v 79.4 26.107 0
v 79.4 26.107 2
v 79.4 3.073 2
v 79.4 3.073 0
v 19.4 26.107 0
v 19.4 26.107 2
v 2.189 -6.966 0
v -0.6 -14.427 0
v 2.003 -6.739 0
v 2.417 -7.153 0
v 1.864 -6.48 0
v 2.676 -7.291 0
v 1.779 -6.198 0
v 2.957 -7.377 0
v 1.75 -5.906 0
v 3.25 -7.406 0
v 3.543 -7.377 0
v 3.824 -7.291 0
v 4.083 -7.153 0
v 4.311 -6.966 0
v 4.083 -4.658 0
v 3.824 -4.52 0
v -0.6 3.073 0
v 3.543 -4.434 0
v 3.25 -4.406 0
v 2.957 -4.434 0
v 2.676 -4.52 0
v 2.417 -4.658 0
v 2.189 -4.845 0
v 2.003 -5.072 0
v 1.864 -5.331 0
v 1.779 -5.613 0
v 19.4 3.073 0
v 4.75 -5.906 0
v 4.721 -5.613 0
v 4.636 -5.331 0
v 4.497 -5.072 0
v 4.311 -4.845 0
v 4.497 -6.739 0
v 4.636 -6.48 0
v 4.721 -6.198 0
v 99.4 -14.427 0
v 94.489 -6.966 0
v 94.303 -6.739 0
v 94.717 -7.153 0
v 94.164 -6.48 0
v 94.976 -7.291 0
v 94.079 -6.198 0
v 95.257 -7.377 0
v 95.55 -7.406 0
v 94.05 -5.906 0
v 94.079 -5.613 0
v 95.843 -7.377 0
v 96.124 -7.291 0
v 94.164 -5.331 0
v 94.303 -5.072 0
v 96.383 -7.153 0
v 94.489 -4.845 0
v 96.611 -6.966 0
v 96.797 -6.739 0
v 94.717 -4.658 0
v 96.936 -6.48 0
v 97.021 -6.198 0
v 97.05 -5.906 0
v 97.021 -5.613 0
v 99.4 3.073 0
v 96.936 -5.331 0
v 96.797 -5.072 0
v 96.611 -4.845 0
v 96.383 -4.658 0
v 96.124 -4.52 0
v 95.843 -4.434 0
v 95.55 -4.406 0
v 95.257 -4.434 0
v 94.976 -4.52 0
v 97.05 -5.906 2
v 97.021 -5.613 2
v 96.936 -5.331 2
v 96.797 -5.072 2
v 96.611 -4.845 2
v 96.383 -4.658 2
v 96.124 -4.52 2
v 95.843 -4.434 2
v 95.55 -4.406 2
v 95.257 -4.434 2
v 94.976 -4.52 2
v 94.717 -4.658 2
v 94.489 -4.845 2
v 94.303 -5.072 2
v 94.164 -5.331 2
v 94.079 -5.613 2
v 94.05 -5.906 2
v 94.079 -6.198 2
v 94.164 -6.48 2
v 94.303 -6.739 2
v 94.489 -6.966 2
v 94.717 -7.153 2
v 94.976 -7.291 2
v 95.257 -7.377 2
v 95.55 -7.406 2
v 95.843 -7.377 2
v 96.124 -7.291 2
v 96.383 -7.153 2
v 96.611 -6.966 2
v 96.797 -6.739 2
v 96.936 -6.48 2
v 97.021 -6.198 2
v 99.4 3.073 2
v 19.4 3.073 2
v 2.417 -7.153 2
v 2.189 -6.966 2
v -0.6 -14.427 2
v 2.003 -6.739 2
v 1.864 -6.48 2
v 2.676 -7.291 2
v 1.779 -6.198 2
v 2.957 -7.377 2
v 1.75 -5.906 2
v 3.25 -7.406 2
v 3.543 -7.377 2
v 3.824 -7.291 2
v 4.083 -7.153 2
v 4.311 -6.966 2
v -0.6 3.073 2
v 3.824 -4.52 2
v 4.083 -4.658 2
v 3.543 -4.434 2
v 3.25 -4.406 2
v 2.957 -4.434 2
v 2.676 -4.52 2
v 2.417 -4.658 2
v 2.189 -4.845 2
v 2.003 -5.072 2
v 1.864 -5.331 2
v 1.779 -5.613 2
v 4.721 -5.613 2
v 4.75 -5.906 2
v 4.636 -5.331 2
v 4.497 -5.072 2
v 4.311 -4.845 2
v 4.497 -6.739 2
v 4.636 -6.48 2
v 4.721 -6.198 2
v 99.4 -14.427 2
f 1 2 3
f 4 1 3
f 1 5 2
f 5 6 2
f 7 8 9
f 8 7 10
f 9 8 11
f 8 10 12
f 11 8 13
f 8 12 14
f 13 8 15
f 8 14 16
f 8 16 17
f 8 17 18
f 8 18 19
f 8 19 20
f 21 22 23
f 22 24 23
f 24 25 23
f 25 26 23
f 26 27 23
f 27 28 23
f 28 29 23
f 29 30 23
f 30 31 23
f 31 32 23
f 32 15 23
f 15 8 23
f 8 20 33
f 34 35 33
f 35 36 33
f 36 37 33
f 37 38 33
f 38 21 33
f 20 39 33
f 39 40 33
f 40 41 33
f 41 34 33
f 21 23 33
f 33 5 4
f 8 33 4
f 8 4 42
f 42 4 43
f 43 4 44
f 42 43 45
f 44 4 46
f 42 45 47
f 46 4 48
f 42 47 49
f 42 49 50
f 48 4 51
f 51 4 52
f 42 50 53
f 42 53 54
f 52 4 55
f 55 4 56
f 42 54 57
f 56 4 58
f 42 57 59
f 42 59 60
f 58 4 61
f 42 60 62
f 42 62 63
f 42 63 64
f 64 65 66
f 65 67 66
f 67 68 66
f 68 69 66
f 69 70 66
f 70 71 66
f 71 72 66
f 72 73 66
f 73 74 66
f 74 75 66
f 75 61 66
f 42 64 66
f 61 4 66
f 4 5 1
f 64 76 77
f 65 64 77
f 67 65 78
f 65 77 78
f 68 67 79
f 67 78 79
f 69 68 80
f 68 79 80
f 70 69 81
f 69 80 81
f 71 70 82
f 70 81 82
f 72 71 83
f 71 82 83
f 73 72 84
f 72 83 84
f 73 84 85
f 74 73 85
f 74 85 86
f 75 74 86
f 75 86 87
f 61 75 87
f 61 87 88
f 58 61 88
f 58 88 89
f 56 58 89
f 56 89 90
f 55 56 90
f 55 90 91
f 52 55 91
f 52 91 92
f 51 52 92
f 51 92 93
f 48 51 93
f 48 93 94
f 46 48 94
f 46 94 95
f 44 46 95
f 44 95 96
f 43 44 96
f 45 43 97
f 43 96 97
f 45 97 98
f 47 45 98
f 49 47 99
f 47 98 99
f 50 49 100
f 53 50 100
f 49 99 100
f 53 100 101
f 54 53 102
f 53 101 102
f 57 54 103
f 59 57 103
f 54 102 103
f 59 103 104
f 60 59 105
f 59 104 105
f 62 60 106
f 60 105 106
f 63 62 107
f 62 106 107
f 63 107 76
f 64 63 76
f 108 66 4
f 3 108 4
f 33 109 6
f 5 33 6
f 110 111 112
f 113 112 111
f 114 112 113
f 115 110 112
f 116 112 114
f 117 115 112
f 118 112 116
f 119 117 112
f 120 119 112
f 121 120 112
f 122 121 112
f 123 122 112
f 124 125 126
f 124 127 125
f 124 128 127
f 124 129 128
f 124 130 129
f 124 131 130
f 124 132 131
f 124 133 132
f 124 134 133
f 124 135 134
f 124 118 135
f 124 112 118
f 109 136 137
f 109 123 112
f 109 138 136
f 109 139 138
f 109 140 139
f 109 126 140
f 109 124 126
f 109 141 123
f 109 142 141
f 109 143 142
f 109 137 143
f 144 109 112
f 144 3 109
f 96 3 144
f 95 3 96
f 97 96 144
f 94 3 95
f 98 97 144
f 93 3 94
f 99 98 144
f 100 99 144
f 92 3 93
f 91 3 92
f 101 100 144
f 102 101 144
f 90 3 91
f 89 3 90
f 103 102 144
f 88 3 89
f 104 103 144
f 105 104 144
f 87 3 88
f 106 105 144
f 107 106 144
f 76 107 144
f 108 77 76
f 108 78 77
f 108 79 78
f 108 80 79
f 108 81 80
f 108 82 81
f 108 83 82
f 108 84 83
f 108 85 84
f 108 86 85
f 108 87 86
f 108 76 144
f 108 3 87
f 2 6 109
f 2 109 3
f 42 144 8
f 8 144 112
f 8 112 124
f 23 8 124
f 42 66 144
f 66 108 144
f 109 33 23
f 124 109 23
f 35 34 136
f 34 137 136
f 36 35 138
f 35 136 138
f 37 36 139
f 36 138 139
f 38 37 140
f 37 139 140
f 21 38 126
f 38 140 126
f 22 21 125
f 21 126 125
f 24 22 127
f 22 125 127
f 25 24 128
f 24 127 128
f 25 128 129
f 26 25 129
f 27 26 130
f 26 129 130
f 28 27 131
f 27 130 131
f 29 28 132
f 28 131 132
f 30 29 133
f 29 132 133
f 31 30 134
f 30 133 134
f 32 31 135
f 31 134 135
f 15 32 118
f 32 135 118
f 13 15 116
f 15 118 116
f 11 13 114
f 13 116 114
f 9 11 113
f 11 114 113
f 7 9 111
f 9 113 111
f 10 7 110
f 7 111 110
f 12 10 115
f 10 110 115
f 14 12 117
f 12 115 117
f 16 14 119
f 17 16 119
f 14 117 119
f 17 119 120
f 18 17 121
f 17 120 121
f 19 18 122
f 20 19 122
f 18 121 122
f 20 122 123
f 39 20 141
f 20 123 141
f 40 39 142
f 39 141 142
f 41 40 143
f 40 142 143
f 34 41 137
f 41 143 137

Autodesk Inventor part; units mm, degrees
ref_plane "YZ Plane" through (0, 0, 0) normal (1, 0, 0) x (0, 1, 0)
ref_plane "XZ Plane" through (0, 0, 0) normal (0, 1, 0) x (-1, 0, 0)
ref_plane "XY Plane" through (0, 0, 0) normal (0, 0, 1) x (1, 0, 0)
sketch "Szkic1" plane through (0, 0, 0) normal (0, 0, 1) x (1, 0, 0)
  line L0 (2.6774, 0.115) -> (-0.6, 0.115) projected
  spline S0 degree 3 poles (3.0833, -0.1968) (3.1541, -0.2257) (3.223, -0.256) (3.5835, -0.4251) (3.888, -0.6087) (4.4504, -1.0382) (4.7087, -1.2836) (5.1613, -1.7912) (5.3932, -2.1042) (5.7913, -2.77) (5.9577, -3.1227) (6.2121, -3.7972) (6.3223, -4.1828) (6.4663, -4.968) (6.5, -5.3675) (6.5, -5.7331) knots -1.428143 -1.428143 -1.428143 -1.428143 -1.406087 -1.406087 -1.308684 -1.308684 -1.211282 -1.211282 -1.104676 -1.104676 -0.99807 -0.99807 -0.888411 -0.888411 -0.778752 -0.778752 -0.778752 -0.778752 projected
  line L1 (6.5, -5.7331) -> (6.5, -13.1255) projected
  circle A0 centre (3.25, -5.9055) radius 1.5 projected
  line L2 (-0.6, 0) -> (-0.6, -13.1255) projected
  line L3 (-0.6, -13.4271) -> (99.4, -13.4271) projected
  line L4 (-0.6, -14.1019) -> (-0.6, -13.1255) projected
  line L5 (6.5, -14.1019) -> (6.5, -13.1255) projected
  line L6 (-0.6, -13.4271) -> (-0.6, -28.9827) projected
  line L7 (-0.6, -13.4271) -> (-0.6, -28.9827) projected
  line L8 (-0.6, -13.4271) -> (99.4, -13.4271)
  line L9 (99.4, -13.4271) -> (99.4, 3.0729)
  line L10 (99.4, 3.0729) -> (-0.6, 3.0729)
  line L11 (-0.6, 3.0729) -> (-0.6, -13.4271)
  point P0 (0, 0)
  dimension "d0" = 16.5
extrude "Wyciągnięcie proste1" add sketch "Szkic1" along normal blind 2 contours A0 | L11 L10 L9 L3 L4 L2
sketch "Szkic2" plane through (0, 0, 2) normal (0, 0, 1) x (1, 0, 0)
  line L0 (79.4, 9.1073) -> (19.4, 9.1073) projected
  line L1 (99.4, 3.0729) -> (-0.6, 3.0729) projected
  line L2 (79.4, 9.1073) -> (19.4, 9.1073)
  line L3 (19.4, 9.1073) -> (19.4, 3.0729)
  line L4 (19.4, 3.0729) -> (79.4, 3.0729)
  line L5 (79.4, 3.0729) -> (79.4, 9.1073)
  point P0 (0, 0)
extrude "Wyciągnięcie proste2" add sketch "Szkic2" against normal up to surface (2 mm away)
sketch "Szkic3" plane through (0, 0, 2) normal (0, 0, 1) x (1, 0, 0)
  line L0 (99.4, -13.4271) -> (99.4, 3.0729) projected
  line L1 (99.4, 3.0729) -> (79.4, 3.0729) projected
  line L2 (79.4, 3.0729) -> (79.4, 9.1073) projected
  line L3 (79.4, 9.1073) -> (19.4, 9.1073) projected
  line L4 (19.4, 9.1073) -> (19.4, 3.0729) projected
  line L5 (19.4, 3.0729) -> (-0.6, 3.0729) projected
  line L6 (-0.6, 3.0729) -> (-0.6, -13.4271) projected
  line L7 (-0.6, -13.4271) -> (99.4, -13.4271) projected
  line L8 (79.4, 9.1073) -> (19.4, 9.1073)
  line L9 (19.4, 9.1073) -> (19.4, 26.1073)
  line L10 (19.4, 26.1073) -> (79.4, 26.1073)
  line L11 (79.4, 26.1073) -> (79.4, 9.1073)
  point P0 (0, 0)
  dimension "d5" = 17
extrude "Wyciągnięcie proste3" add sketch "Szkic3" against normal blind 2 contours L3 L9 L10 L11
sketch "Szkic4" plane through (0, 0, 2) normal (0, 0, 1) x (1, 0, 0)
  circle A0 centre (3.25, -5.9055) radius 1.5 projected
  line L0 (79.4, 26.1073) -> (19.4, 26.1073) projected
  line L1 (19.4, 26.1073) -> (79.4, 26.1073) projected
  line L2 (49.4, 26.1073) -> (49.4, -13.4271)
  line L3 (-0.6, -13.4271) -> (99.4, -13.4271) projected
  circle A1 centre (95.55, -5.9055) radius 1.5
  point P0 (0, 0)
extrude "Wyciągnięcie proste4" cut sketch "Szkic4" against normal through all
sketch "Szkic5" plane through (0, 0, 2) normal (0, 0, 1) x (1, 0, 0)
  line L0 (-0.6, -13.4271) -> (99.4, -13.4271) projected
  line L1 (-0.6, 3.0729) -> (-0.6, -13.4271) projected
  line L2 (-0.6, -13.4271) -> (99.4, -13.4271)
  line L3 (99.4, -13.4271) -> (99.4, -14.4271)
  line L4 (99.4, -14.4271) -> (-0.6, -14.4271)
  line L5 (-0.6, -14.4271) -> (-0.6, -13.4271)
  point P0 (0, 0)
  dimension "d10" = 1
extrude "Wyciągnięcie proste5" add sketch "Szkic5" against normal up to surface (2 mm away)
properties part number "tylna"
